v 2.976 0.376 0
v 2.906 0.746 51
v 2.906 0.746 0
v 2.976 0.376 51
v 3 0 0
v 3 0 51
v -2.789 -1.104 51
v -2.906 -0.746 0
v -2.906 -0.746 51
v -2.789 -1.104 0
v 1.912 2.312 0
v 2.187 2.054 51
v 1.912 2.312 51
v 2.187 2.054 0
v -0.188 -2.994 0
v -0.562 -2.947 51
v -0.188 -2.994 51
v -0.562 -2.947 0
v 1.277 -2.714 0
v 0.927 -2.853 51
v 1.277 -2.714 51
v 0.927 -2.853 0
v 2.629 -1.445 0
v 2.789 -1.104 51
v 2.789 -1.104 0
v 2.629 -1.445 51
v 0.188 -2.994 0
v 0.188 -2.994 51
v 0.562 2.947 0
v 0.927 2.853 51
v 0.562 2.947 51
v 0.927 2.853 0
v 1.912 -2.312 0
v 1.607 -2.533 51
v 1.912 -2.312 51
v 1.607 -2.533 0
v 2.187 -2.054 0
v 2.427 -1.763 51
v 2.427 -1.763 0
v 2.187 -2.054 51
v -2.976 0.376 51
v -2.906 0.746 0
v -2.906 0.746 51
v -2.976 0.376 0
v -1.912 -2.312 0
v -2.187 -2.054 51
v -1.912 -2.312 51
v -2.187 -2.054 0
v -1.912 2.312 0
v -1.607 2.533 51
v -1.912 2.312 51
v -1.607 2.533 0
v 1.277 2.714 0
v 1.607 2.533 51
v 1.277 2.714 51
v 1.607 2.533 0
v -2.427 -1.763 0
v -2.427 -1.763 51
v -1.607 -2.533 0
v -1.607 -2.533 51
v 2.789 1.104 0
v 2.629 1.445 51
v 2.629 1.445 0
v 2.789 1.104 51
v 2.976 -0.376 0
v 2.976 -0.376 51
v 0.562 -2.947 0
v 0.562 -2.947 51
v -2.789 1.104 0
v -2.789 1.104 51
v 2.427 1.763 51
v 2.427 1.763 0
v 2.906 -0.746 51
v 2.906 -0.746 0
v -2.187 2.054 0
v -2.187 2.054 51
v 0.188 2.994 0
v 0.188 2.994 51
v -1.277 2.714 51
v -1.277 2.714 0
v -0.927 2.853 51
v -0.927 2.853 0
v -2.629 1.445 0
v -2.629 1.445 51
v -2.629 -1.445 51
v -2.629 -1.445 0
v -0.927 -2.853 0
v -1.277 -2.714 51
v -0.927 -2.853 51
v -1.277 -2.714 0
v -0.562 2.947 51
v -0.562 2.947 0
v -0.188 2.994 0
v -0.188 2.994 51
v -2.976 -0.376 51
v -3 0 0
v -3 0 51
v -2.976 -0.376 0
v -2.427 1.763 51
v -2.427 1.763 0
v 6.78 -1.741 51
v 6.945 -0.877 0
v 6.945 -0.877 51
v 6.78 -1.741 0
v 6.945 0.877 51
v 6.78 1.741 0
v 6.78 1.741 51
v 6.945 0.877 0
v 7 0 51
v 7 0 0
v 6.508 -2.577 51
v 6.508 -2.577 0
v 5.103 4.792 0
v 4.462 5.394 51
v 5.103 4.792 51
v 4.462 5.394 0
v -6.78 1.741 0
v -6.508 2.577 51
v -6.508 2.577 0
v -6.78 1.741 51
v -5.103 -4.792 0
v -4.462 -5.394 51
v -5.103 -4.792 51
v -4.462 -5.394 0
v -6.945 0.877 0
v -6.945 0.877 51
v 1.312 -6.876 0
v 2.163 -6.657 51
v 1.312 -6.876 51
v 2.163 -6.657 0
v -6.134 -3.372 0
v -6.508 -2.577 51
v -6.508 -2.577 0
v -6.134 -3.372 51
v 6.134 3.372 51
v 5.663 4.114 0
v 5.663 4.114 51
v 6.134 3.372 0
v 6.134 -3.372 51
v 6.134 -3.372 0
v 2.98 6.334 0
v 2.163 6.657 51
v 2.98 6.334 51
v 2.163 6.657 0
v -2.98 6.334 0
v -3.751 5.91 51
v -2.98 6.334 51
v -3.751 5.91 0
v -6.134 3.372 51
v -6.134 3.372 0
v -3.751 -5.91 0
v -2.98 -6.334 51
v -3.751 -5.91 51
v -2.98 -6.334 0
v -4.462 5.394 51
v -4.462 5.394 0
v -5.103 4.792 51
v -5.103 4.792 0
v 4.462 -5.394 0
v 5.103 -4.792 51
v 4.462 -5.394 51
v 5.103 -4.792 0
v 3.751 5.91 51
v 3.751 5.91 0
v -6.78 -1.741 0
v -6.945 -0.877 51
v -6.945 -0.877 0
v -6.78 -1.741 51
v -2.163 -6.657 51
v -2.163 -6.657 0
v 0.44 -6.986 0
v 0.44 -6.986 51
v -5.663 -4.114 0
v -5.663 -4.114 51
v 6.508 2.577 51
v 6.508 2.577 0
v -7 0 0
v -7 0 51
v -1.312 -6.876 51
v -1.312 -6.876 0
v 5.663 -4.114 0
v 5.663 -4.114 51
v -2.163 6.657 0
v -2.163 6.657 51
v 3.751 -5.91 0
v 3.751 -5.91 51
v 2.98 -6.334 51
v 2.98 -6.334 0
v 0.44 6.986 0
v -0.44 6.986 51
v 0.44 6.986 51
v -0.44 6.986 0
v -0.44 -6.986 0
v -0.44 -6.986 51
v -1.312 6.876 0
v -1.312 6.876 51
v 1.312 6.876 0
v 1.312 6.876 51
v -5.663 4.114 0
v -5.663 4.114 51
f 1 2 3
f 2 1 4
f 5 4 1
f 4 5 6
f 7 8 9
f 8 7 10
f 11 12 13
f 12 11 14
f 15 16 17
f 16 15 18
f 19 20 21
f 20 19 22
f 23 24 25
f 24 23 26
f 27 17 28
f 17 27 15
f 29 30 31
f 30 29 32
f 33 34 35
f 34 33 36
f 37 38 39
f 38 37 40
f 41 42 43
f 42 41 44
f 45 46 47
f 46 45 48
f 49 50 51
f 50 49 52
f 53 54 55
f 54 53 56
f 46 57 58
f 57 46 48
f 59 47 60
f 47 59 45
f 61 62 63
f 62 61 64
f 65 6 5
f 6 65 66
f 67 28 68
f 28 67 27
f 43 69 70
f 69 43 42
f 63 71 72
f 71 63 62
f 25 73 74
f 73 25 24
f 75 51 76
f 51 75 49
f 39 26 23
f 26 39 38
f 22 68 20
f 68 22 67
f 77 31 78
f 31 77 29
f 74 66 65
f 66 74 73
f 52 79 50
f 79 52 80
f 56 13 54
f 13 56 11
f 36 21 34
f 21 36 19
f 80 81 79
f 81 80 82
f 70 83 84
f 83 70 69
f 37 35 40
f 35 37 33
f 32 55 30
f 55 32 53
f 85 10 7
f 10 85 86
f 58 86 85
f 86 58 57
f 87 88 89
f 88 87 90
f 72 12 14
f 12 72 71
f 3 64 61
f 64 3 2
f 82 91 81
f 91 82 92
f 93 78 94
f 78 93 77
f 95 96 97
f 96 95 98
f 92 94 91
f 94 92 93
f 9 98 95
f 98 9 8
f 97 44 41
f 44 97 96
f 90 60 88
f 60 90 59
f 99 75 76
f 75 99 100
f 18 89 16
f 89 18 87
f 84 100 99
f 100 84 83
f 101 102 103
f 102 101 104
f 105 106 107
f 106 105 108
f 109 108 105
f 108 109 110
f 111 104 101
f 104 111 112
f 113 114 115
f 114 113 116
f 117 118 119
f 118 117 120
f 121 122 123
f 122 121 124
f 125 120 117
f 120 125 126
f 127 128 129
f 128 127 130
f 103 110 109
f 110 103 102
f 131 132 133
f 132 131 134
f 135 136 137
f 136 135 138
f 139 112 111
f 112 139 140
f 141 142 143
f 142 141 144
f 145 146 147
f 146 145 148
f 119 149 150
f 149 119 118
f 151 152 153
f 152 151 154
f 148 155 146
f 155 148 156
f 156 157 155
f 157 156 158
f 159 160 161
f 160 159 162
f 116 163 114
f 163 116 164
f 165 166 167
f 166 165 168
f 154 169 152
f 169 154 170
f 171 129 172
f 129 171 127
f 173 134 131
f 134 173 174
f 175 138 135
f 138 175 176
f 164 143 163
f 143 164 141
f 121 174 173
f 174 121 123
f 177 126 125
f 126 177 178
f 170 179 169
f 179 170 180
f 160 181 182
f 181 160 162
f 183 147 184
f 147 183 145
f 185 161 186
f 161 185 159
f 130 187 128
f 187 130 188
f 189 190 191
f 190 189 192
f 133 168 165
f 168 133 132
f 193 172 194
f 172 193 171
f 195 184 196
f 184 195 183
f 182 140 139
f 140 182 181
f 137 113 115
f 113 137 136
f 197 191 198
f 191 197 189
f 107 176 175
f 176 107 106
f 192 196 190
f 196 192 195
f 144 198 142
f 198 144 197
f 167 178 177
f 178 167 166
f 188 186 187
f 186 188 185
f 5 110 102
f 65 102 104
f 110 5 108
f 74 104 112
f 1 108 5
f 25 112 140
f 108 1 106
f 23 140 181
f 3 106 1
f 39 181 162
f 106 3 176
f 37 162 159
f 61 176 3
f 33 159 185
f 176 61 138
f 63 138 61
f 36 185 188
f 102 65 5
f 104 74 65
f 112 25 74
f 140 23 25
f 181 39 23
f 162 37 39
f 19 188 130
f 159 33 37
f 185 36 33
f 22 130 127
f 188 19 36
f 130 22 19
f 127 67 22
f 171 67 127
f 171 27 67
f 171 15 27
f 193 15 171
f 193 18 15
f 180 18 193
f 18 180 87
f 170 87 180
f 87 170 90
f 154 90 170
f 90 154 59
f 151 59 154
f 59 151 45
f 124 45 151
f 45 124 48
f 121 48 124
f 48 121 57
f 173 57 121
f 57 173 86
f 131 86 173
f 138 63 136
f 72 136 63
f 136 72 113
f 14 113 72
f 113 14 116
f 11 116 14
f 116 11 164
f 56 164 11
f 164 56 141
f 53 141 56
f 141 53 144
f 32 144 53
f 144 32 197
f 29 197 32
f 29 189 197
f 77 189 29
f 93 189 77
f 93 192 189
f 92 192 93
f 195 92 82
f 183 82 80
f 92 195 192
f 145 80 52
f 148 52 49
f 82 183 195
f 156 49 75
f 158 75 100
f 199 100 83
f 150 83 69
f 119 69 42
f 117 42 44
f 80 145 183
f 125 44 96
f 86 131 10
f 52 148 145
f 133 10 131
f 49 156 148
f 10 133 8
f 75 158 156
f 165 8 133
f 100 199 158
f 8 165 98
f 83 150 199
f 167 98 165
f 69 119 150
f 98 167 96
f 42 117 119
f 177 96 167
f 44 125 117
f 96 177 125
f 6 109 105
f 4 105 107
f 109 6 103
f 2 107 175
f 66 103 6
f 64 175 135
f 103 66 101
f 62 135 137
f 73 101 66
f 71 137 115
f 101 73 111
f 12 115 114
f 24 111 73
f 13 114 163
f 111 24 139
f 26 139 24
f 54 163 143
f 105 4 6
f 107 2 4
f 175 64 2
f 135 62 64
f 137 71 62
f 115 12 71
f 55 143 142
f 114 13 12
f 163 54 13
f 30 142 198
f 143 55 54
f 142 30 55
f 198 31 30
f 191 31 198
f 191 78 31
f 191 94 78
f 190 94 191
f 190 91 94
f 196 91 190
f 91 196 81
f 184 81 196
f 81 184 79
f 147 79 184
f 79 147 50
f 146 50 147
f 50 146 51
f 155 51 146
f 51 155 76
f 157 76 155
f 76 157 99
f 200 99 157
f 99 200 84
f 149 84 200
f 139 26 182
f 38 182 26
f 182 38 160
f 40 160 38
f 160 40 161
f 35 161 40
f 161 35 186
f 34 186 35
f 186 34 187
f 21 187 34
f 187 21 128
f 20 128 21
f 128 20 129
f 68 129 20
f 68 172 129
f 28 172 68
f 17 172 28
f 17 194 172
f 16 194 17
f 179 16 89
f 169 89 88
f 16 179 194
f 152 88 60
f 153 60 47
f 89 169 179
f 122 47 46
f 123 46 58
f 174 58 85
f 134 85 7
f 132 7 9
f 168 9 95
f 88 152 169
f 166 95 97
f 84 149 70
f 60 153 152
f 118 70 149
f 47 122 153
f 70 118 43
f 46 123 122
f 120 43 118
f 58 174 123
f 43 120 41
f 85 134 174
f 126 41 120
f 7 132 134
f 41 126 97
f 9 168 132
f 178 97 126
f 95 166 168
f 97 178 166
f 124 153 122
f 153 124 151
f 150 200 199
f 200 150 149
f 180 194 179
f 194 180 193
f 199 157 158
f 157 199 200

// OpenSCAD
$fn = 50;


difference() {
	union() {
		cylinder(h = 51, r = 7.0000000000);
	}
	union() {
		translate(v = [0, 0, -100]) {
			cylinder(h = 200, r = 3.0000000000);
		}
		translate(v = [0, 0, -100]) {
			cylinder(h = 200, r = 1.5000000000);
		}
	}
}
